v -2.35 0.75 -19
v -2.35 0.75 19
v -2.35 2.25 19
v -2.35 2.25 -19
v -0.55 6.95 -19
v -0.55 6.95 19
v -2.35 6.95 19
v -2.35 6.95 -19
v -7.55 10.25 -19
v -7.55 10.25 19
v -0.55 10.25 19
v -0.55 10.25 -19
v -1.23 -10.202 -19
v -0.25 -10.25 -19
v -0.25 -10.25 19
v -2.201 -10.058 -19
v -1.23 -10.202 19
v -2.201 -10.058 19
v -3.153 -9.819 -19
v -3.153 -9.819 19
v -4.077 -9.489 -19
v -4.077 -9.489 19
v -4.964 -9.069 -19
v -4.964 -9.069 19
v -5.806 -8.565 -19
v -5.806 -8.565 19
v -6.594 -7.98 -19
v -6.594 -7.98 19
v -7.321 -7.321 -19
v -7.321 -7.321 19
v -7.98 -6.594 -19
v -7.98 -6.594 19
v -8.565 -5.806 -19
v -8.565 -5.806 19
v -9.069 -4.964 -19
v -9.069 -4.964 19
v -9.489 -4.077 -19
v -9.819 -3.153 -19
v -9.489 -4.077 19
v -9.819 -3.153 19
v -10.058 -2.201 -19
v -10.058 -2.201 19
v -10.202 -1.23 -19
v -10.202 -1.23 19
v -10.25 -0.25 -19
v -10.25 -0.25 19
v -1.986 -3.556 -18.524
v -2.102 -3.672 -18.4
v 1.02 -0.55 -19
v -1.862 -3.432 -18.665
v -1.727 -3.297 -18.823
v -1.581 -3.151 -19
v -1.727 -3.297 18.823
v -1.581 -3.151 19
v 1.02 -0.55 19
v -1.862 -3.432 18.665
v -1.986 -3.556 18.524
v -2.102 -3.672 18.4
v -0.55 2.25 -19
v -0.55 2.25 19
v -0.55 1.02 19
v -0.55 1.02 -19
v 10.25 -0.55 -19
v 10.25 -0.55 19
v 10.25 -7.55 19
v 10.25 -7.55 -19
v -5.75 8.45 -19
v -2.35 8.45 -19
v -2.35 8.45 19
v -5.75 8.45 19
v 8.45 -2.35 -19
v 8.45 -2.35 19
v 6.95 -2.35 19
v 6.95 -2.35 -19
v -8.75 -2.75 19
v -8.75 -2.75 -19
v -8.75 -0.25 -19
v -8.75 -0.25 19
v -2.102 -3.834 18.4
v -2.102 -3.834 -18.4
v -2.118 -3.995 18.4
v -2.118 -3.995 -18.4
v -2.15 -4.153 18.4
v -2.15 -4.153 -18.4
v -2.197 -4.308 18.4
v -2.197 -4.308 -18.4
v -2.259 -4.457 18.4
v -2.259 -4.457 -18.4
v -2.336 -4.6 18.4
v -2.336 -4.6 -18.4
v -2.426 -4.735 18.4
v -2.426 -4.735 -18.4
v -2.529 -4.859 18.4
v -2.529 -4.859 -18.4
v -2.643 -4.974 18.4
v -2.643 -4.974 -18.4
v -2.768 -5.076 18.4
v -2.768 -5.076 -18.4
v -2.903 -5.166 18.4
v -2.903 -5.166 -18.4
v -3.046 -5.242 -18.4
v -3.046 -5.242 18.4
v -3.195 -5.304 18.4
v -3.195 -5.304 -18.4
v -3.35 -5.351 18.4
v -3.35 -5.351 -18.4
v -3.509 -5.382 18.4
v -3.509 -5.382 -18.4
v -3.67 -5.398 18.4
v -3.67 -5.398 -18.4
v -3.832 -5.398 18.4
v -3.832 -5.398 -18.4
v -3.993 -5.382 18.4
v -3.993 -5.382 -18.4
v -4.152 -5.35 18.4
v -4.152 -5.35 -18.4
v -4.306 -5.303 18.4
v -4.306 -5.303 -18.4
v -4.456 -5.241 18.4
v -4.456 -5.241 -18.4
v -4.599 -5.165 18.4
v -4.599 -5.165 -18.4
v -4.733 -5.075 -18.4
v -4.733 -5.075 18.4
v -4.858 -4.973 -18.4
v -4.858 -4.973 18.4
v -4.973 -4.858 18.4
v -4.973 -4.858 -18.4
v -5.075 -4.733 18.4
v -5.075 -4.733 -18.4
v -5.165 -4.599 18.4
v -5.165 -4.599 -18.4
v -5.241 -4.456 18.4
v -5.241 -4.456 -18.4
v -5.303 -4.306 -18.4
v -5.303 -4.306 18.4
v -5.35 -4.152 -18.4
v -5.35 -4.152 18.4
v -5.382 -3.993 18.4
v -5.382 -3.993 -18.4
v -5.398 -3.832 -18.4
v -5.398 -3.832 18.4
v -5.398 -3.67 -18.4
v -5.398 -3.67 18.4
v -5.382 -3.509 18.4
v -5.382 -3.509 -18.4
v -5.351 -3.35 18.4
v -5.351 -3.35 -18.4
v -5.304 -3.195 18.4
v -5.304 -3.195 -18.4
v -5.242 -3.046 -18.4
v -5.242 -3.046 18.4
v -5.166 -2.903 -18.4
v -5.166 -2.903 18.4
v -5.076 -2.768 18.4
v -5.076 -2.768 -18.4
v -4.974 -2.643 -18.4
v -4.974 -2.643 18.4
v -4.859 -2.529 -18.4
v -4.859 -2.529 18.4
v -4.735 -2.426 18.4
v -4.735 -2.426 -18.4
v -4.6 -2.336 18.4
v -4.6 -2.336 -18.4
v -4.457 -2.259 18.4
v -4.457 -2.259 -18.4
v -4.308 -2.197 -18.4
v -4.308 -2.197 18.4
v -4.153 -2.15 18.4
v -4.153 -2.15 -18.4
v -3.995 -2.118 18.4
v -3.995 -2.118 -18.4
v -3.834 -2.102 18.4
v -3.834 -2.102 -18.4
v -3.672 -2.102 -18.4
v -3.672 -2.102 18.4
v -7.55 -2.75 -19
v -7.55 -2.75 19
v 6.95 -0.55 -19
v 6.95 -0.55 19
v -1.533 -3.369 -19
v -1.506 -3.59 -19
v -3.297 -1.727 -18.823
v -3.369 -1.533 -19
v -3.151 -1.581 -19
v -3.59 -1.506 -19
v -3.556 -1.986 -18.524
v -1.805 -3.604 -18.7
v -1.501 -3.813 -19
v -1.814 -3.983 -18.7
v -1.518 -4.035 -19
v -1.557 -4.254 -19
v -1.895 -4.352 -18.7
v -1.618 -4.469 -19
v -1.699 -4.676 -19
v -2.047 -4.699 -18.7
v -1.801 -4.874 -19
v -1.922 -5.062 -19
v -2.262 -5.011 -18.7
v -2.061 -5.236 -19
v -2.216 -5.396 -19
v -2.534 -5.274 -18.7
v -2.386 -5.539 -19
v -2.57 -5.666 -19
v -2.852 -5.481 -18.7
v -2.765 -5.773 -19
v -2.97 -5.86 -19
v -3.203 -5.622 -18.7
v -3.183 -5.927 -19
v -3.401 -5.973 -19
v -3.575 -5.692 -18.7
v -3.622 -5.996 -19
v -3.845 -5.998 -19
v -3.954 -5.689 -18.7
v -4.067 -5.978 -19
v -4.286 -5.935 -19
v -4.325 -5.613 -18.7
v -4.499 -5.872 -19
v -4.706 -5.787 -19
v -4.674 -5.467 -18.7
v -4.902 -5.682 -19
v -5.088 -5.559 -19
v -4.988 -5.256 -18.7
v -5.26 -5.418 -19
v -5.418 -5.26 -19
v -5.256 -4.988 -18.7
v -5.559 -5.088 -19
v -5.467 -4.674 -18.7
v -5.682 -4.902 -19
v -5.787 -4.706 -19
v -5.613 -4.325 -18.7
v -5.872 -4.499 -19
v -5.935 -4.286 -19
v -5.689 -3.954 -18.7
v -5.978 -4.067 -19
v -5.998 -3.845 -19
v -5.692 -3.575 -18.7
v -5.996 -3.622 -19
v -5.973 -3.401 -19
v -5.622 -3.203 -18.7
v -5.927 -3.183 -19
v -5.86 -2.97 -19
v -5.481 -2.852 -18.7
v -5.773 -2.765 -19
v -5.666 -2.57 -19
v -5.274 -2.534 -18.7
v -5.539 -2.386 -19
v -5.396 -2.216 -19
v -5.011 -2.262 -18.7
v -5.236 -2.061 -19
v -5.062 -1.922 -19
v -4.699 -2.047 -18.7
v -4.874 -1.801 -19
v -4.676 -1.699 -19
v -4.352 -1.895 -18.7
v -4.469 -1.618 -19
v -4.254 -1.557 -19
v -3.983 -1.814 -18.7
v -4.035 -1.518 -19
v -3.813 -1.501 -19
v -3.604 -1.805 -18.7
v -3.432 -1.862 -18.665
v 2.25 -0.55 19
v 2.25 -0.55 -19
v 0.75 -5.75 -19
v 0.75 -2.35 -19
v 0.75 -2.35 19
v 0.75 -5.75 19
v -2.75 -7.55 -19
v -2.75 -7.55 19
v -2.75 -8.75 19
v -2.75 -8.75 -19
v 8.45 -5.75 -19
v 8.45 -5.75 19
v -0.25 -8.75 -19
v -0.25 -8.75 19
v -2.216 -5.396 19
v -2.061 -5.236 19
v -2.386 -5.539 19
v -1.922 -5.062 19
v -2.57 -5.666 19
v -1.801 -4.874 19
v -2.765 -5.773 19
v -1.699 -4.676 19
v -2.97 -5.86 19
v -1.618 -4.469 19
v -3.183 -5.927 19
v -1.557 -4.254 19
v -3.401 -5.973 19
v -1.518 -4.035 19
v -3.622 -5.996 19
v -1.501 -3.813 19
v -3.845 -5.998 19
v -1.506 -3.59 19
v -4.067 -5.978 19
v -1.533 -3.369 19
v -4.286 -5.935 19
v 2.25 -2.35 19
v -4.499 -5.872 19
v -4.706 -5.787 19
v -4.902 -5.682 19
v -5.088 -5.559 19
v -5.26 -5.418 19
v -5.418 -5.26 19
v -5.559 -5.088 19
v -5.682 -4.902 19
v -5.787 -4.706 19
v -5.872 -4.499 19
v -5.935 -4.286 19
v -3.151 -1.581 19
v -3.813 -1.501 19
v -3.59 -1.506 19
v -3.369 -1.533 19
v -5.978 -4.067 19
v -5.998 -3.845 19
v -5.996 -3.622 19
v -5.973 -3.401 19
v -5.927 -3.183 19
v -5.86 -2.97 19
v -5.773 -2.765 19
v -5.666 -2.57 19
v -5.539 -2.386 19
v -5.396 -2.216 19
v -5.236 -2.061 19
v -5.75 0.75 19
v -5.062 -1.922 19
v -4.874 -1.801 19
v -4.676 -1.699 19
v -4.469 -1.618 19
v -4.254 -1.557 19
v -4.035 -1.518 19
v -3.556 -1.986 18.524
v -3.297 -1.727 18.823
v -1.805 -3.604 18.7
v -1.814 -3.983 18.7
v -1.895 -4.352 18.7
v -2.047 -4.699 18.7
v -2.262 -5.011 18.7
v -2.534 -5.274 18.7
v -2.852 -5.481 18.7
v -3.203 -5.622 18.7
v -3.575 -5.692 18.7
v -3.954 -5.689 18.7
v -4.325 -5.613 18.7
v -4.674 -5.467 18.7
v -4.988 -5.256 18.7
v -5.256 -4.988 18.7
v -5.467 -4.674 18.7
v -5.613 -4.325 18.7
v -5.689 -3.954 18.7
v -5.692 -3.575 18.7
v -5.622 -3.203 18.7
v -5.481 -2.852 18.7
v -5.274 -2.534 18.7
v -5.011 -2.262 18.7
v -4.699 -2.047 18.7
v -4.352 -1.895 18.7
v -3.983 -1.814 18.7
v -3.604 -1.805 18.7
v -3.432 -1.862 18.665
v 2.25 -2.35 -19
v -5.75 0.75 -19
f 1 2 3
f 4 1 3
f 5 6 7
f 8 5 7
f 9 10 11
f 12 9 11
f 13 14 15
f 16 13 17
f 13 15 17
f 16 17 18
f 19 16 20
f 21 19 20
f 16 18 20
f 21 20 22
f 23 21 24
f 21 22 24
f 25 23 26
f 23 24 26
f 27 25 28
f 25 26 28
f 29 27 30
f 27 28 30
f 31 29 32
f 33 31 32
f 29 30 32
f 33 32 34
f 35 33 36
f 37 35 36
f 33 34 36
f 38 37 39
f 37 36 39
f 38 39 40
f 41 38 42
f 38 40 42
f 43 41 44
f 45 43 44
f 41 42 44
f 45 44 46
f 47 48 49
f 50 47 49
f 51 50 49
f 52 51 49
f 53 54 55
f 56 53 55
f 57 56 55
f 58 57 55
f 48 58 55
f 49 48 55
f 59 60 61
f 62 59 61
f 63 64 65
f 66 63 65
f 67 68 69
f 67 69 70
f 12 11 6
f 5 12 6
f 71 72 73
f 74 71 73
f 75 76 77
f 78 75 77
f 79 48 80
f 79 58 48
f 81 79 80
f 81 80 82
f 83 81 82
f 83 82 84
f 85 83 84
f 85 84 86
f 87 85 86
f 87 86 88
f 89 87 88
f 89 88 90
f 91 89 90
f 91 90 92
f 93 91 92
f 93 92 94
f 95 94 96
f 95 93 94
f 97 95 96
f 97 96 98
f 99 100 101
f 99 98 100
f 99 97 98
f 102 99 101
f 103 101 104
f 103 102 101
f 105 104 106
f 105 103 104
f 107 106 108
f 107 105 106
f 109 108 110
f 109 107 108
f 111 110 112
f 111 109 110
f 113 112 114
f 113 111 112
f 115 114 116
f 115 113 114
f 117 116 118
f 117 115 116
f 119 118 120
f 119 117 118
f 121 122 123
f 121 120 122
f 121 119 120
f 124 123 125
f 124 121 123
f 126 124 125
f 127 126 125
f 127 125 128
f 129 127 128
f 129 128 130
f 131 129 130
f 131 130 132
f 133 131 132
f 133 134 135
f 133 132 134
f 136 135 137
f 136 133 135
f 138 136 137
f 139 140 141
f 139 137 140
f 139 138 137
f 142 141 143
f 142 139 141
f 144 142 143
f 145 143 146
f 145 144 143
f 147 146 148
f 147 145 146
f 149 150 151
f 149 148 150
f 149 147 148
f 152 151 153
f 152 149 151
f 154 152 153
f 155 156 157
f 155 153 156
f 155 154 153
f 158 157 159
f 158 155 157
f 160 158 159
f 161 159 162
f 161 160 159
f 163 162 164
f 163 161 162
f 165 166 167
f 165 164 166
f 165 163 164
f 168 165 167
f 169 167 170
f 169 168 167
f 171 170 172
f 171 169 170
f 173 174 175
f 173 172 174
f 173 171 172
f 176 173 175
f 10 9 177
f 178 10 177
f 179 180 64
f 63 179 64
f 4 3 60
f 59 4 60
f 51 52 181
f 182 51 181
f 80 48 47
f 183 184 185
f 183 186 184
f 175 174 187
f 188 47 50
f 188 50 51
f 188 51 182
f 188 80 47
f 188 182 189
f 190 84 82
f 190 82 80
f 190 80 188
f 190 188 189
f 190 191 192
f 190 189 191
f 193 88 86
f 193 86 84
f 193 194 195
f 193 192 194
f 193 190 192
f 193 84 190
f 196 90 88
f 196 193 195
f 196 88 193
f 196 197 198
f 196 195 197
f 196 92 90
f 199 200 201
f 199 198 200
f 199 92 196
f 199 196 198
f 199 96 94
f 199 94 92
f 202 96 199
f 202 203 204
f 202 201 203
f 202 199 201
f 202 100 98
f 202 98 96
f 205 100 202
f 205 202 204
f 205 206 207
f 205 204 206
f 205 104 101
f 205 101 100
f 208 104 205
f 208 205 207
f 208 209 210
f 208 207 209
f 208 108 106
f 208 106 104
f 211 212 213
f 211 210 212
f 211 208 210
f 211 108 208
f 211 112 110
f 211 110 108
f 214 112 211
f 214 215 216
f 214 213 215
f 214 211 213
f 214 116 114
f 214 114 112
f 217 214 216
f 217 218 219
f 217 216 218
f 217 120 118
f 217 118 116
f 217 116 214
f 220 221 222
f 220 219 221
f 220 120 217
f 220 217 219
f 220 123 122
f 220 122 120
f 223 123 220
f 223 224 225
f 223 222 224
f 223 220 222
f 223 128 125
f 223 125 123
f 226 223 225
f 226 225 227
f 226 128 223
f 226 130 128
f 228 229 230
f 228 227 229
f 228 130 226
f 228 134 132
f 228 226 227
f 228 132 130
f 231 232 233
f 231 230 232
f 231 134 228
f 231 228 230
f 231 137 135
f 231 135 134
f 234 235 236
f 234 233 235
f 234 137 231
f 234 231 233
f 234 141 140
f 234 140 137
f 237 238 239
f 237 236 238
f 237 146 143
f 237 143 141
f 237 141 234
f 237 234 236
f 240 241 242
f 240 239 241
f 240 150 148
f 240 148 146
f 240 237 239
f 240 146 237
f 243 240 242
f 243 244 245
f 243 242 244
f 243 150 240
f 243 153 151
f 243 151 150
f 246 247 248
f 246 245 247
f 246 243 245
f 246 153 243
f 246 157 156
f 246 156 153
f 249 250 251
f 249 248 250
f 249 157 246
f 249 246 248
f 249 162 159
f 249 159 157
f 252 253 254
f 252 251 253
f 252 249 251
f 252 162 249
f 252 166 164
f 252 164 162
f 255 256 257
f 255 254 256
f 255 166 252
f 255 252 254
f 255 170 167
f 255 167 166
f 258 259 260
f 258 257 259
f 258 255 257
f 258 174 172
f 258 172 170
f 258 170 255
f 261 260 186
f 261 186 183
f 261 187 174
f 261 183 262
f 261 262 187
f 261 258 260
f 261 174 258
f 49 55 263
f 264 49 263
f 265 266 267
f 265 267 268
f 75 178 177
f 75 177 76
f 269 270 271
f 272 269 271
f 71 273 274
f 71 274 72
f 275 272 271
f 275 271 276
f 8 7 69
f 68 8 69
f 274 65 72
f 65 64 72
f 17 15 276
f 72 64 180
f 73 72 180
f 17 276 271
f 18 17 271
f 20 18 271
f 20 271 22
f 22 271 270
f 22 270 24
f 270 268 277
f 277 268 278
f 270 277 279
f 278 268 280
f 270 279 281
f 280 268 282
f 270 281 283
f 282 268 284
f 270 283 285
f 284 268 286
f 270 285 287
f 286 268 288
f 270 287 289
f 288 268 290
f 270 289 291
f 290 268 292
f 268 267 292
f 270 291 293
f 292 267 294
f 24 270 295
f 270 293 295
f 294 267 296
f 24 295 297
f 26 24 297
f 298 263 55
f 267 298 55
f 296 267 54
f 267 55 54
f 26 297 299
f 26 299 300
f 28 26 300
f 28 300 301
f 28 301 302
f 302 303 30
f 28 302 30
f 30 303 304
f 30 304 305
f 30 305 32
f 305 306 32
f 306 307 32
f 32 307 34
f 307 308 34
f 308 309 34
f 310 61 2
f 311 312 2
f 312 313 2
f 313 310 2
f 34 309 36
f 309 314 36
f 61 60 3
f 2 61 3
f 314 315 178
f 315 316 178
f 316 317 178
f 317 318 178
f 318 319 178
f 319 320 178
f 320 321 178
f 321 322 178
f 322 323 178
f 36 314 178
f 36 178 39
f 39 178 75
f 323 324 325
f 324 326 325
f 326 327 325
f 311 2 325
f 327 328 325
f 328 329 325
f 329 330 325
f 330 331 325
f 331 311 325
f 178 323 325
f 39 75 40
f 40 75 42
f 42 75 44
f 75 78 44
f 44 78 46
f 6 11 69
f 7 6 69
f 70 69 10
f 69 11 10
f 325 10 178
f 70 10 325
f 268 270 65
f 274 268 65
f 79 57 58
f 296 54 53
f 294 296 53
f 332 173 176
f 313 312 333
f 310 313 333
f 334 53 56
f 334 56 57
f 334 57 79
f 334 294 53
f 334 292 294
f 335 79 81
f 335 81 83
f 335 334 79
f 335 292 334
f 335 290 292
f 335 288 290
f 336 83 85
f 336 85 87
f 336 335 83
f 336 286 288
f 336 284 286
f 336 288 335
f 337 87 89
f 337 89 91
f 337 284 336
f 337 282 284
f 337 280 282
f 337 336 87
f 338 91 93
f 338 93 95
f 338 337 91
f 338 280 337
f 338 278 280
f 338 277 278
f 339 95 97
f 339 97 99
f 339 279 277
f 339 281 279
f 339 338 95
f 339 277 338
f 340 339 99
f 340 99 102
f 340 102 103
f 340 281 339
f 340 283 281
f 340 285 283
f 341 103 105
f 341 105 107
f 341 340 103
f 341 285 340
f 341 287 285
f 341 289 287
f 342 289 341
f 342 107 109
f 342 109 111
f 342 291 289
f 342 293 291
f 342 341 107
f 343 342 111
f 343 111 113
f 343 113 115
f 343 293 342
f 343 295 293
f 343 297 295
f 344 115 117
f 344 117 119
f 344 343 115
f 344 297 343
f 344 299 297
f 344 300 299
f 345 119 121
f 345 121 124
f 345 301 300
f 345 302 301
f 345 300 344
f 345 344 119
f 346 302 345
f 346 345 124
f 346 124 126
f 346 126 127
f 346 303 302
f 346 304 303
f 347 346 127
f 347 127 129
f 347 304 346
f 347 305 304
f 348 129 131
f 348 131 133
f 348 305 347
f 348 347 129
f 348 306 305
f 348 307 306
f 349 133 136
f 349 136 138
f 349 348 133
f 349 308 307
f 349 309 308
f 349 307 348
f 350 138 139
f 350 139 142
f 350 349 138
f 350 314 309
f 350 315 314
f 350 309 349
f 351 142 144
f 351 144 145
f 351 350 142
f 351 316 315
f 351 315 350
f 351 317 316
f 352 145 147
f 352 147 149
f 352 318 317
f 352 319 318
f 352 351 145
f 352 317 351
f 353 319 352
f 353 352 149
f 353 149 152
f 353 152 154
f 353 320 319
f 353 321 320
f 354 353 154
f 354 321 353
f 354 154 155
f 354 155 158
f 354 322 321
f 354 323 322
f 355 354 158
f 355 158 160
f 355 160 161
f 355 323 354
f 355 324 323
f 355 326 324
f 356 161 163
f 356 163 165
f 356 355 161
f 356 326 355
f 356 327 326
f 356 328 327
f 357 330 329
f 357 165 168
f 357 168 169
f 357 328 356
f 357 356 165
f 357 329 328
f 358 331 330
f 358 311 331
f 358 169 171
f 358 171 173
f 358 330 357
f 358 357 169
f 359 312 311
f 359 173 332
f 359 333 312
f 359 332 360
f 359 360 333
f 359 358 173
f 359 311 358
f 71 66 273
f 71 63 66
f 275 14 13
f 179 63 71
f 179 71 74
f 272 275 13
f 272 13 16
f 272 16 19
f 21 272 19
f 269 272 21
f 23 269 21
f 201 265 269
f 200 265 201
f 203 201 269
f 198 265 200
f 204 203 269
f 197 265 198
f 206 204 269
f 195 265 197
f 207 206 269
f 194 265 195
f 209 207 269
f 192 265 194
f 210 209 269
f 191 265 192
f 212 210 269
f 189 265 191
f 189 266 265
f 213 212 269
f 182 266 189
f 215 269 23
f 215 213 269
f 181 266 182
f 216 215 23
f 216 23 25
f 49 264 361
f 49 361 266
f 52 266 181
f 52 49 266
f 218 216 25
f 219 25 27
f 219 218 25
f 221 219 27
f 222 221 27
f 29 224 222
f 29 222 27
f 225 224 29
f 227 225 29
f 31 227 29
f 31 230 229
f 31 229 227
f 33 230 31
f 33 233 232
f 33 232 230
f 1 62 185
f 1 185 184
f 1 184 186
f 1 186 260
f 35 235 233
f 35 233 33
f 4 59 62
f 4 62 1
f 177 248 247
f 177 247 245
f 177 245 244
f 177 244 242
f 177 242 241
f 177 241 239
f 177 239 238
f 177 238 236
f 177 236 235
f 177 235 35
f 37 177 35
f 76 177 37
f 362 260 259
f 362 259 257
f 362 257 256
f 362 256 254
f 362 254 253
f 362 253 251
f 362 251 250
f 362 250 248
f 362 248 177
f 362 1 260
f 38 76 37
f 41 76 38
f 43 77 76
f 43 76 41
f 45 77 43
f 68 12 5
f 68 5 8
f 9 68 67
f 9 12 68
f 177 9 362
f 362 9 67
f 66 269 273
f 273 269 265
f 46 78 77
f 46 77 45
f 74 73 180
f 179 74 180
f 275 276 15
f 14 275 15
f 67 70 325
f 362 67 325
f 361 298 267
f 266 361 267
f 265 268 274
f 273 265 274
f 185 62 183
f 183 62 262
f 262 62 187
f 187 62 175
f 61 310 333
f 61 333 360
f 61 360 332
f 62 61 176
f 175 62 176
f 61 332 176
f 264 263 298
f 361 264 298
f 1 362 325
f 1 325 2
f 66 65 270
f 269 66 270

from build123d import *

# Parameters (mm, degrees)
EXTRUDE1_DEPTH     = 19
CUT_EXTRUDE1_DEPTH = 39
CUT_EXTRUDE2_DEPTH = 39


with BuildPart() as part:
    # Sketch1 → Extrude1 (new body, symmetric)
    with BuildSketch(Plane.XY):
        with BuildLine():
            Line((-10.25, 10.25), (10.25, 10.25))
            Line((10.25, 10.25), (10.25, -10.25))
            Line((10.25, -10.25), (-0.25, -10.25))
            ThreePointArc((-0.25, -10.25), (-7.321067812, -7.321067812), (-10.25, -0.25))
            Line((-10.25, -0.25), (-10.25, 10.25))
        make_face()
    extrude(amount=EXTRUDE1_DEPTH, both=True)

    # Sketch2 → Cut-Extrude1 (cut, through all)
    with BuildSketch(Plane.XY.offset(19)):
        Polygon((10.25, -7.55), (-2.75, -7.55), (-2.75, -8.75), (-0.25, -8.75), (-0.25, -10.25), (10.25, -10.25), align=None)
        Polygon((-7.55, 10.25), (-7.55, -2.75), (-8.75, -2.75), (-8.75, -0.25), (-10.25, -0.25), (-10.25, 10.25), align=None)
    extrude(amount=-CUT_EXTRUDE1_DEPTH, mode=Mode.SUBTRACT)

    # Sketch3 → Cut-Extrude2 (cut, through all)
    with BuildSketch(Plane.XY.offset(19)):
        with BuildLine():
            Line((-0.55, 10.25), (-0.55, 6.95))
            Line((-0.55, 6.95), (-2.35, 6.95))
            Line((-2.35, 6.95), (-2.35, 8.45))
            Line((-2.35, 8.45), (-5.75, 8.45))
            Line((-5.75, 8.45), (-5.75, 0.75))
            Line((-5.75, 0.75), (-2.35, 0.75))
            Line((-2.35, 0.75), (-2.35, 2.25))
            Line((-2.35, 2.25), (-0.55, 2.25))
            Line((-0.55, 2.25), (-0.55, 1.02))
            Line((-0.55, 1.02), (-3.821715344, -2.251715344))
            ThreePointArc((-3.821715344, -2.251715344), (-4.810660172, -4.810660172), (-2.251715344, -3.821715344))
            Line((-2.251715344, -3.821715344), (1.02, -0.55))
            Line((1.02, -0.55), (2.25, -0.55))
            Line((2.25, -0.55), (2.25, -2.35))
            Line((2.25, -2.35), (0.75, -2.35))
            Line((0.75, -2.35), (0.75, -5.75))
            Line((0.75, -5.75), (8.45, -5.75))
            Line((8.45, -5.75), (8.45, -2.35))
            Line((8.45, -2.35), (6.95, -2.35))
            Line((6.95, -2.35), (6.95, -0.55))
            Line((6.95, -0.55), (10.25, -0.55))
            Line((10.25, -0.55), (10.25, 10.25))
            Line((10.25, 10.25), (-0.55, 10.25))
        make_face()
    extrude(amount=-CUT_EXTRUDE2_DEPTH, mode=Mode.SUBTRACT)

    # Esboço1 → Furo roscado de M41 (revolve, cut)
    with BuildSketch(Plane(origin=(-3.75, -3.75, 19), x_dir=(0, -1, 0), z_dir=(1, 0, 0))):
        Polygon((0, 0), (0, 38), (2.25, 38), (1.65, 37.4), (1.65, 0.6), (2.25, 0), align=None)
    revolve(axis=Axis((-3.75, -3.75, 25.35), (0, 0, -1)), mode=Mode.SUBTRACT)


solid = part.part
